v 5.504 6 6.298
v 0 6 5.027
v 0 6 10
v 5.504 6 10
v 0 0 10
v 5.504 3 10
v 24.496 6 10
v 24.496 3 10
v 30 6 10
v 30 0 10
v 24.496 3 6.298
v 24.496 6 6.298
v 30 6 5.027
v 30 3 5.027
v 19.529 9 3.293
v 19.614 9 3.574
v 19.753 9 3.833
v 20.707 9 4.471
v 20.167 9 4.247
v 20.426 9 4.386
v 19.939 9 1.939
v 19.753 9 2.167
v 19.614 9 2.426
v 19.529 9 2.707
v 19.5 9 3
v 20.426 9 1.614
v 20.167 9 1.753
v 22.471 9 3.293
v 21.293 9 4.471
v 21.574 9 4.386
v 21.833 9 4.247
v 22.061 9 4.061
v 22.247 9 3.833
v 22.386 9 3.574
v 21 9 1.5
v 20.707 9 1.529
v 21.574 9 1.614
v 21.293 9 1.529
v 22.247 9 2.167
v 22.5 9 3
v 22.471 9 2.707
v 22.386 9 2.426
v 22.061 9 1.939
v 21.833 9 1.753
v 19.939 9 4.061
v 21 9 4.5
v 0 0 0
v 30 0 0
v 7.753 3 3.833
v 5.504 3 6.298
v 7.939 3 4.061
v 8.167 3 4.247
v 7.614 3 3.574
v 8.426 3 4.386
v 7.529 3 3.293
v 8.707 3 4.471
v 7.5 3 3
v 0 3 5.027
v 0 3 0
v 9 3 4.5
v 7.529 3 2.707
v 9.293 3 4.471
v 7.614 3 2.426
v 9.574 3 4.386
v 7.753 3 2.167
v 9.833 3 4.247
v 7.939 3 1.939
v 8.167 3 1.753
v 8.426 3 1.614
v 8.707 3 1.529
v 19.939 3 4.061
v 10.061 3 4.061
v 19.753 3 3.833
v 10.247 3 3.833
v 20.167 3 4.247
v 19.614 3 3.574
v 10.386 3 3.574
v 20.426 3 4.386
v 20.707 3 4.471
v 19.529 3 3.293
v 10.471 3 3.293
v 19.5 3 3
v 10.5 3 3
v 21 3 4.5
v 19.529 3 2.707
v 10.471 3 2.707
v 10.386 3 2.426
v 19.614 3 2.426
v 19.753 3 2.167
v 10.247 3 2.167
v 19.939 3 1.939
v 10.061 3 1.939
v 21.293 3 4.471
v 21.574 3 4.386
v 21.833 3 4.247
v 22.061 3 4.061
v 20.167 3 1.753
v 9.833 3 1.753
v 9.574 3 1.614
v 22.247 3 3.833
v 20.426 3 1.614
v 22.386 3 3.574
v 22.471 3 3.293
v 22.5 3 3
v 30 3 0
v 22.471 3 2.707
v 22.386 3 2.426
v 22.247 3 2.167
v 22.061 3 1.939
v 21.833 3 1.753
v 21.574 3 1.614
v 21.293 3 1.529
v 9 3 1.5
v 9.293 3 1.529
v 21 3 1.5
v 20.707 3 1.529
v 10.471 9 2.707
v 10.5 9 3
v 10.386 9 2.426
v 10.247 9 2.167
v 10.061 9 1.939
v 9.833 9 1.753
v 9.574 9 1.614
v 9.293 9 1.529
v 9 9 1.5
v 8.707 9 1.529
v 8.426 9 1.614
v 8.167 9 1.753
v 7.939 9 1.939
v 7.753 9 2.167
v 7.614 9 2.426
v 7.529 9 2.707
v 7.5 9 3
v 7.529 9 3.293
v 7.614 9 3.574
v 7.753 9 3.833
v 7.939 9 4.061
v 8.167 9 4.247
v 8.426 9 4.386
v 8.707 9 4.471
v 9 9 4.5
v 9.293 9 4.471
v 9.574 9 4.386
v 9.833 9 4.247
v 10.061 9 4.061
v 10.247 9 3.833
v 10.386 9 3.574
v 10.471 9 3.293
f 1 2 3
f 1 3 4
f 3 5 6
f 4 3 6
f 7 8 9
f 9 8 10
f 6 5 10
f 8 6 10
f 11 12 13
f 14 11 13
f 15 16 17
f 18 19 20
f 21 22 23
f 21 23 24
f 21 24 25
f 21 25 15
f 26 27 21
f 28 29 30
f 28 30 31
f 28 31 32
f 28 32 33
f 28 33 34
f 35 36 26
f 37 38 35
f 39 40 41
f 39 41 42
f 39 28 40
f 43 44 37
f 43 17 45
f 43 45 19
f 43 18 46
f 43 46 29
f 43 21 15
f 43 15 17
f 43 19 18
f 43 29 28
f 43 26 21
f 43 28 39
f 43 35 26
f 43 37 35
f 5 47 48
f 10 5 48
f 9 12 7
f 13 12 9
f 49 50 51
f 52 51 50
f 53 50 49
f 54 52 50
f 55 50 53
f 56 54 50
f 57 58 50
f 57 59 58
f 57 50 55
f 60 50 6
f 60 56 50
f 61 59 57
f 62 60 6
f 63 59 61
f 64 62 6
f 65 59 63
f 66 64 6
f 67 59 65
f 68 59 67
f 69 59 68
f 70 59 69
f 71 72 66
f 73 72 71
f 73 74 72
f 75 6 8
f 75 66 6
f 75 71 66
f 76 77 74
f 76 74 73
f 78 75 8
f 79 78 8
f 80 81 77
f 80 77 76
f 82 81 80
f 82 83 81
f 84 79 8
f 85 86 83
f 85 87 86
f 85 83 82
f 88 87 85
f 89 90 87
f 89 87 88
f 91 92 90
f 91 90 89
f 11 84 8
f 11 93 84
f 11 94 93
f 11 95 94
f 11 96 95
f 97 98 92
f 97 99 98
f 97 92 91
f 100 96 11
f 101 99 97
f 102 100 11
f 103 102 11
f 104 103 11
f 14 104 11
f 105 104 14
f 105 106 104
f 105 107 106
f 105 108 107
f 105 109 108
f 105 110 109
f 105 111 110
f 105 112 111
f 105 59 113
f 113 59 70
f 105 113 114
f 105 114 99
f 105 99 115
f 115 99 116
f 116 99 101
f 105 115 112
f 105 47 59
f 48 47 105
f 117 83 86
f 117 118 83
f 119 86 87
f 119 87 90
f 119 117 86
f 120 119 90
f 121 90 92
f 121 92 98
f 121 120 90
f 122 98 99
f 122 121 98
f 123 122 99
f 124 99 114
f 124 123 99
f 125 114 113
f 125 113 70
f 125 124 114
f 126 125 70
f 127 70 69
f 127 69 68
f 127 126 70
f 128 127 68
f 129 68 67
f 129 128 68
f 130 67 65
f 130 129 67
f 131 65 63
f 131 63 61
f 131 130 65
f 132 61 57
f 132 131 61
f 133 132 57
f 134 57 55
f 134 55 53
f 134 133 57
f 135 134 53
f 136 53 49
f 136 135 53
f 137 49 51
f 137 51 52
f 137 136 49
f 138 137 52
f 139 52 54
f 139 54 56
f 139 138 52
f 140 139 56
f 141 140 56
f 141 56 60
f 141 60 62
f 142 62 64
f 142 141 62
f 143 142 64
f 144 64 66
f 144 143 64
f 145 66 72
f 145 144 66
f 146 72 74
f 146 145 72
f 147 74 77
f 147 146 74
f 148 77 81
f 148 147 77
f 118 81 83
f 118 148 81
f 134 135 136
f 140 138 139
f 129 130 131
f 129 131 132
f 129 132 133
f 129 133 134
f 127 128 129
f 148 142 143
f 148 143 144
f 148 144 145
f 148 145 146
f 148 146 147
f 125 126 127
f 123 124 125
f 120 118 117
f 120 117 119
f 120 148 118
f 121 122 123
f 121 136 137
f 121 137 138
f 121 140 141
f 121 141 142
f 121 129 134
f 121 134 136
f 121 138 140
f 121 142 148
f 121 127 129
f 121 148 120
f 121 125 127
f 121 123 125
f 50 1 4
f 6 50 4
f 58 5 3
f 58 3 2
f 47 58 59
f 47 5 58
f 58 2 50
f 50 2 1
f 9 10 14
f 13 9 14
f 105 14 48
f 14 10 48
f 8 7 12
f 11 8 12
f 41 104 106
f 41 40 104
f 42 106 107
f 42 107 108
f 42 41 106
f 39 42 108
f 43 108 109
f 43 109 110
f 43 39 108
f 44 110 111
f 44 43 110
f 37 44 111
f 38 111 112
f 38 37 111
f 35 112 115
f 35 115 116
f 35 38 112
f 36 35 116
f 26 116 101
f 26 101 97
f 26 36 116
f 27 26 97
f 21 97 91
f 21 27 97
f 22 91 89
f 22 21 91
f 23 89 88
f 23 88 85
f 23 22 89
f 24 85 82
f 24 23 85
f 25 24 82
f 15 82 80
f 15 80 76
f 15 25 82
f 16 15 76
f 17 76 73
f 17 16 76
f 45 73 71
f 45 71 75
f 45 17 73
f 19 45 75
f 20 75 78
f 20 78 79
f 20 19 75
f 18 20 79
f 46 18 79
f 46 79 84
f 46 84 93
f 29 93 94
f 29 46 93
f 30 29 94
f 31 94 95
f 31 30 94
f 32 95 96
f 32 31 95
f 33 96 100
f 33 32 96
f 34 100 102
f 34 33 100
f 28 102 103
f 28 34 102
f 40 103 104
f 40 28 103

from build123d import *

# Parameters (mm, degrees)
SKETCH2_W             = 30
SKETCH2_H             = 10
BOSS_EXTRUDE2_DEPTH   = 6
CUT_EXTRUDE1_DEPTH    = 3
SKETCH4_4_R           = 1.5
BOSS_EXTRUDE4_DEPTH   = 3
BOSS_EXTRUDE4_2_DEPTH = 3
SKETCH4_5_R           = 1.5
BOSS_EXTRUDE5_DEPTH   = 3


with BuildPart() as part:
    # Sketch2 → Boss-Extrude2 (new body)
    with BuildSketch(Plane(origin=(0, 0, 0), x_dir=(1, 0, 0), z_dir=(0, 1, 0))):
        with Locations((15, -5)):
            Rectangle(SKETCH2_W, SKETCH2_H)
    extrude(amount=BOSS_EXTRUDE2_DEPTH)

    # Sketch4 → Cut-Extrude1 (cut)
    with BuildSketch(Plane(origin=(0, 6, 0), x_dir=(1, 0, 0), z_dir=(0, 1, 0))):
        Polygon((0, -5.027402711), (5.504275855, -6.298164921), (5.504275855, -10), (24.495724145, -10), (24.495724145, -6.298164921), (30, -5.027402711), (30, 0), (0, 0), align=None)
    extrude(amount=-CUT_EXTRUDE1_DEPTH, mode=Mode.SUBTRACT)



with BuildPart() as body_2:
    # Sketch4<4> → Boss-Extrude4 (new body)
    with BuildSketch(Plane(origin=(0, 6, 0), x_dir=(1, 0, 0), z_dir=(0, 1, 0))):
        with Locations((9, -3)):
            Circle(SKETCH4_4_R)
    extrude(amount=BOSS_EXTRUDE4_DEPTH)


with BuildPart() as body_3:
    # Sketch4<4> → Boss-Extrude4 2 (new body)
    with BuildSketch(Plane(origin=(0, 6, 0), x_dir=(1, 0, 0), z_dir=(0, 1, 0))):
        with Locations((21, -3)):
            Circle(SKETCH4_4_R)
    extrude(amount=BOSS_EXTRUDE4_2_DEPTH)


with BuildPart() as part_1:
    add(part.part)

    add(body_2.part)  # Boss-Extrude5 merges body 2

    add(body_3.part)  # Boss-Extrude5 merges body 3
    # Sketch4<5> → Boss-Extrude5 (add)
    with BuildSketch(Plane(origin=(0, 6, 0), x_dir=(1, 0, 0), z_dir=(0, 1, 0))):
        with Locations((9, -3)):
            Circle(SKETCH4_5_R)
        with Locations((21, -3)):
            Circle(SKETCH4_5_R)
    extrude(amount=-BOSS_EXTRUDE5_DEPTH)


solid = part_1.part
